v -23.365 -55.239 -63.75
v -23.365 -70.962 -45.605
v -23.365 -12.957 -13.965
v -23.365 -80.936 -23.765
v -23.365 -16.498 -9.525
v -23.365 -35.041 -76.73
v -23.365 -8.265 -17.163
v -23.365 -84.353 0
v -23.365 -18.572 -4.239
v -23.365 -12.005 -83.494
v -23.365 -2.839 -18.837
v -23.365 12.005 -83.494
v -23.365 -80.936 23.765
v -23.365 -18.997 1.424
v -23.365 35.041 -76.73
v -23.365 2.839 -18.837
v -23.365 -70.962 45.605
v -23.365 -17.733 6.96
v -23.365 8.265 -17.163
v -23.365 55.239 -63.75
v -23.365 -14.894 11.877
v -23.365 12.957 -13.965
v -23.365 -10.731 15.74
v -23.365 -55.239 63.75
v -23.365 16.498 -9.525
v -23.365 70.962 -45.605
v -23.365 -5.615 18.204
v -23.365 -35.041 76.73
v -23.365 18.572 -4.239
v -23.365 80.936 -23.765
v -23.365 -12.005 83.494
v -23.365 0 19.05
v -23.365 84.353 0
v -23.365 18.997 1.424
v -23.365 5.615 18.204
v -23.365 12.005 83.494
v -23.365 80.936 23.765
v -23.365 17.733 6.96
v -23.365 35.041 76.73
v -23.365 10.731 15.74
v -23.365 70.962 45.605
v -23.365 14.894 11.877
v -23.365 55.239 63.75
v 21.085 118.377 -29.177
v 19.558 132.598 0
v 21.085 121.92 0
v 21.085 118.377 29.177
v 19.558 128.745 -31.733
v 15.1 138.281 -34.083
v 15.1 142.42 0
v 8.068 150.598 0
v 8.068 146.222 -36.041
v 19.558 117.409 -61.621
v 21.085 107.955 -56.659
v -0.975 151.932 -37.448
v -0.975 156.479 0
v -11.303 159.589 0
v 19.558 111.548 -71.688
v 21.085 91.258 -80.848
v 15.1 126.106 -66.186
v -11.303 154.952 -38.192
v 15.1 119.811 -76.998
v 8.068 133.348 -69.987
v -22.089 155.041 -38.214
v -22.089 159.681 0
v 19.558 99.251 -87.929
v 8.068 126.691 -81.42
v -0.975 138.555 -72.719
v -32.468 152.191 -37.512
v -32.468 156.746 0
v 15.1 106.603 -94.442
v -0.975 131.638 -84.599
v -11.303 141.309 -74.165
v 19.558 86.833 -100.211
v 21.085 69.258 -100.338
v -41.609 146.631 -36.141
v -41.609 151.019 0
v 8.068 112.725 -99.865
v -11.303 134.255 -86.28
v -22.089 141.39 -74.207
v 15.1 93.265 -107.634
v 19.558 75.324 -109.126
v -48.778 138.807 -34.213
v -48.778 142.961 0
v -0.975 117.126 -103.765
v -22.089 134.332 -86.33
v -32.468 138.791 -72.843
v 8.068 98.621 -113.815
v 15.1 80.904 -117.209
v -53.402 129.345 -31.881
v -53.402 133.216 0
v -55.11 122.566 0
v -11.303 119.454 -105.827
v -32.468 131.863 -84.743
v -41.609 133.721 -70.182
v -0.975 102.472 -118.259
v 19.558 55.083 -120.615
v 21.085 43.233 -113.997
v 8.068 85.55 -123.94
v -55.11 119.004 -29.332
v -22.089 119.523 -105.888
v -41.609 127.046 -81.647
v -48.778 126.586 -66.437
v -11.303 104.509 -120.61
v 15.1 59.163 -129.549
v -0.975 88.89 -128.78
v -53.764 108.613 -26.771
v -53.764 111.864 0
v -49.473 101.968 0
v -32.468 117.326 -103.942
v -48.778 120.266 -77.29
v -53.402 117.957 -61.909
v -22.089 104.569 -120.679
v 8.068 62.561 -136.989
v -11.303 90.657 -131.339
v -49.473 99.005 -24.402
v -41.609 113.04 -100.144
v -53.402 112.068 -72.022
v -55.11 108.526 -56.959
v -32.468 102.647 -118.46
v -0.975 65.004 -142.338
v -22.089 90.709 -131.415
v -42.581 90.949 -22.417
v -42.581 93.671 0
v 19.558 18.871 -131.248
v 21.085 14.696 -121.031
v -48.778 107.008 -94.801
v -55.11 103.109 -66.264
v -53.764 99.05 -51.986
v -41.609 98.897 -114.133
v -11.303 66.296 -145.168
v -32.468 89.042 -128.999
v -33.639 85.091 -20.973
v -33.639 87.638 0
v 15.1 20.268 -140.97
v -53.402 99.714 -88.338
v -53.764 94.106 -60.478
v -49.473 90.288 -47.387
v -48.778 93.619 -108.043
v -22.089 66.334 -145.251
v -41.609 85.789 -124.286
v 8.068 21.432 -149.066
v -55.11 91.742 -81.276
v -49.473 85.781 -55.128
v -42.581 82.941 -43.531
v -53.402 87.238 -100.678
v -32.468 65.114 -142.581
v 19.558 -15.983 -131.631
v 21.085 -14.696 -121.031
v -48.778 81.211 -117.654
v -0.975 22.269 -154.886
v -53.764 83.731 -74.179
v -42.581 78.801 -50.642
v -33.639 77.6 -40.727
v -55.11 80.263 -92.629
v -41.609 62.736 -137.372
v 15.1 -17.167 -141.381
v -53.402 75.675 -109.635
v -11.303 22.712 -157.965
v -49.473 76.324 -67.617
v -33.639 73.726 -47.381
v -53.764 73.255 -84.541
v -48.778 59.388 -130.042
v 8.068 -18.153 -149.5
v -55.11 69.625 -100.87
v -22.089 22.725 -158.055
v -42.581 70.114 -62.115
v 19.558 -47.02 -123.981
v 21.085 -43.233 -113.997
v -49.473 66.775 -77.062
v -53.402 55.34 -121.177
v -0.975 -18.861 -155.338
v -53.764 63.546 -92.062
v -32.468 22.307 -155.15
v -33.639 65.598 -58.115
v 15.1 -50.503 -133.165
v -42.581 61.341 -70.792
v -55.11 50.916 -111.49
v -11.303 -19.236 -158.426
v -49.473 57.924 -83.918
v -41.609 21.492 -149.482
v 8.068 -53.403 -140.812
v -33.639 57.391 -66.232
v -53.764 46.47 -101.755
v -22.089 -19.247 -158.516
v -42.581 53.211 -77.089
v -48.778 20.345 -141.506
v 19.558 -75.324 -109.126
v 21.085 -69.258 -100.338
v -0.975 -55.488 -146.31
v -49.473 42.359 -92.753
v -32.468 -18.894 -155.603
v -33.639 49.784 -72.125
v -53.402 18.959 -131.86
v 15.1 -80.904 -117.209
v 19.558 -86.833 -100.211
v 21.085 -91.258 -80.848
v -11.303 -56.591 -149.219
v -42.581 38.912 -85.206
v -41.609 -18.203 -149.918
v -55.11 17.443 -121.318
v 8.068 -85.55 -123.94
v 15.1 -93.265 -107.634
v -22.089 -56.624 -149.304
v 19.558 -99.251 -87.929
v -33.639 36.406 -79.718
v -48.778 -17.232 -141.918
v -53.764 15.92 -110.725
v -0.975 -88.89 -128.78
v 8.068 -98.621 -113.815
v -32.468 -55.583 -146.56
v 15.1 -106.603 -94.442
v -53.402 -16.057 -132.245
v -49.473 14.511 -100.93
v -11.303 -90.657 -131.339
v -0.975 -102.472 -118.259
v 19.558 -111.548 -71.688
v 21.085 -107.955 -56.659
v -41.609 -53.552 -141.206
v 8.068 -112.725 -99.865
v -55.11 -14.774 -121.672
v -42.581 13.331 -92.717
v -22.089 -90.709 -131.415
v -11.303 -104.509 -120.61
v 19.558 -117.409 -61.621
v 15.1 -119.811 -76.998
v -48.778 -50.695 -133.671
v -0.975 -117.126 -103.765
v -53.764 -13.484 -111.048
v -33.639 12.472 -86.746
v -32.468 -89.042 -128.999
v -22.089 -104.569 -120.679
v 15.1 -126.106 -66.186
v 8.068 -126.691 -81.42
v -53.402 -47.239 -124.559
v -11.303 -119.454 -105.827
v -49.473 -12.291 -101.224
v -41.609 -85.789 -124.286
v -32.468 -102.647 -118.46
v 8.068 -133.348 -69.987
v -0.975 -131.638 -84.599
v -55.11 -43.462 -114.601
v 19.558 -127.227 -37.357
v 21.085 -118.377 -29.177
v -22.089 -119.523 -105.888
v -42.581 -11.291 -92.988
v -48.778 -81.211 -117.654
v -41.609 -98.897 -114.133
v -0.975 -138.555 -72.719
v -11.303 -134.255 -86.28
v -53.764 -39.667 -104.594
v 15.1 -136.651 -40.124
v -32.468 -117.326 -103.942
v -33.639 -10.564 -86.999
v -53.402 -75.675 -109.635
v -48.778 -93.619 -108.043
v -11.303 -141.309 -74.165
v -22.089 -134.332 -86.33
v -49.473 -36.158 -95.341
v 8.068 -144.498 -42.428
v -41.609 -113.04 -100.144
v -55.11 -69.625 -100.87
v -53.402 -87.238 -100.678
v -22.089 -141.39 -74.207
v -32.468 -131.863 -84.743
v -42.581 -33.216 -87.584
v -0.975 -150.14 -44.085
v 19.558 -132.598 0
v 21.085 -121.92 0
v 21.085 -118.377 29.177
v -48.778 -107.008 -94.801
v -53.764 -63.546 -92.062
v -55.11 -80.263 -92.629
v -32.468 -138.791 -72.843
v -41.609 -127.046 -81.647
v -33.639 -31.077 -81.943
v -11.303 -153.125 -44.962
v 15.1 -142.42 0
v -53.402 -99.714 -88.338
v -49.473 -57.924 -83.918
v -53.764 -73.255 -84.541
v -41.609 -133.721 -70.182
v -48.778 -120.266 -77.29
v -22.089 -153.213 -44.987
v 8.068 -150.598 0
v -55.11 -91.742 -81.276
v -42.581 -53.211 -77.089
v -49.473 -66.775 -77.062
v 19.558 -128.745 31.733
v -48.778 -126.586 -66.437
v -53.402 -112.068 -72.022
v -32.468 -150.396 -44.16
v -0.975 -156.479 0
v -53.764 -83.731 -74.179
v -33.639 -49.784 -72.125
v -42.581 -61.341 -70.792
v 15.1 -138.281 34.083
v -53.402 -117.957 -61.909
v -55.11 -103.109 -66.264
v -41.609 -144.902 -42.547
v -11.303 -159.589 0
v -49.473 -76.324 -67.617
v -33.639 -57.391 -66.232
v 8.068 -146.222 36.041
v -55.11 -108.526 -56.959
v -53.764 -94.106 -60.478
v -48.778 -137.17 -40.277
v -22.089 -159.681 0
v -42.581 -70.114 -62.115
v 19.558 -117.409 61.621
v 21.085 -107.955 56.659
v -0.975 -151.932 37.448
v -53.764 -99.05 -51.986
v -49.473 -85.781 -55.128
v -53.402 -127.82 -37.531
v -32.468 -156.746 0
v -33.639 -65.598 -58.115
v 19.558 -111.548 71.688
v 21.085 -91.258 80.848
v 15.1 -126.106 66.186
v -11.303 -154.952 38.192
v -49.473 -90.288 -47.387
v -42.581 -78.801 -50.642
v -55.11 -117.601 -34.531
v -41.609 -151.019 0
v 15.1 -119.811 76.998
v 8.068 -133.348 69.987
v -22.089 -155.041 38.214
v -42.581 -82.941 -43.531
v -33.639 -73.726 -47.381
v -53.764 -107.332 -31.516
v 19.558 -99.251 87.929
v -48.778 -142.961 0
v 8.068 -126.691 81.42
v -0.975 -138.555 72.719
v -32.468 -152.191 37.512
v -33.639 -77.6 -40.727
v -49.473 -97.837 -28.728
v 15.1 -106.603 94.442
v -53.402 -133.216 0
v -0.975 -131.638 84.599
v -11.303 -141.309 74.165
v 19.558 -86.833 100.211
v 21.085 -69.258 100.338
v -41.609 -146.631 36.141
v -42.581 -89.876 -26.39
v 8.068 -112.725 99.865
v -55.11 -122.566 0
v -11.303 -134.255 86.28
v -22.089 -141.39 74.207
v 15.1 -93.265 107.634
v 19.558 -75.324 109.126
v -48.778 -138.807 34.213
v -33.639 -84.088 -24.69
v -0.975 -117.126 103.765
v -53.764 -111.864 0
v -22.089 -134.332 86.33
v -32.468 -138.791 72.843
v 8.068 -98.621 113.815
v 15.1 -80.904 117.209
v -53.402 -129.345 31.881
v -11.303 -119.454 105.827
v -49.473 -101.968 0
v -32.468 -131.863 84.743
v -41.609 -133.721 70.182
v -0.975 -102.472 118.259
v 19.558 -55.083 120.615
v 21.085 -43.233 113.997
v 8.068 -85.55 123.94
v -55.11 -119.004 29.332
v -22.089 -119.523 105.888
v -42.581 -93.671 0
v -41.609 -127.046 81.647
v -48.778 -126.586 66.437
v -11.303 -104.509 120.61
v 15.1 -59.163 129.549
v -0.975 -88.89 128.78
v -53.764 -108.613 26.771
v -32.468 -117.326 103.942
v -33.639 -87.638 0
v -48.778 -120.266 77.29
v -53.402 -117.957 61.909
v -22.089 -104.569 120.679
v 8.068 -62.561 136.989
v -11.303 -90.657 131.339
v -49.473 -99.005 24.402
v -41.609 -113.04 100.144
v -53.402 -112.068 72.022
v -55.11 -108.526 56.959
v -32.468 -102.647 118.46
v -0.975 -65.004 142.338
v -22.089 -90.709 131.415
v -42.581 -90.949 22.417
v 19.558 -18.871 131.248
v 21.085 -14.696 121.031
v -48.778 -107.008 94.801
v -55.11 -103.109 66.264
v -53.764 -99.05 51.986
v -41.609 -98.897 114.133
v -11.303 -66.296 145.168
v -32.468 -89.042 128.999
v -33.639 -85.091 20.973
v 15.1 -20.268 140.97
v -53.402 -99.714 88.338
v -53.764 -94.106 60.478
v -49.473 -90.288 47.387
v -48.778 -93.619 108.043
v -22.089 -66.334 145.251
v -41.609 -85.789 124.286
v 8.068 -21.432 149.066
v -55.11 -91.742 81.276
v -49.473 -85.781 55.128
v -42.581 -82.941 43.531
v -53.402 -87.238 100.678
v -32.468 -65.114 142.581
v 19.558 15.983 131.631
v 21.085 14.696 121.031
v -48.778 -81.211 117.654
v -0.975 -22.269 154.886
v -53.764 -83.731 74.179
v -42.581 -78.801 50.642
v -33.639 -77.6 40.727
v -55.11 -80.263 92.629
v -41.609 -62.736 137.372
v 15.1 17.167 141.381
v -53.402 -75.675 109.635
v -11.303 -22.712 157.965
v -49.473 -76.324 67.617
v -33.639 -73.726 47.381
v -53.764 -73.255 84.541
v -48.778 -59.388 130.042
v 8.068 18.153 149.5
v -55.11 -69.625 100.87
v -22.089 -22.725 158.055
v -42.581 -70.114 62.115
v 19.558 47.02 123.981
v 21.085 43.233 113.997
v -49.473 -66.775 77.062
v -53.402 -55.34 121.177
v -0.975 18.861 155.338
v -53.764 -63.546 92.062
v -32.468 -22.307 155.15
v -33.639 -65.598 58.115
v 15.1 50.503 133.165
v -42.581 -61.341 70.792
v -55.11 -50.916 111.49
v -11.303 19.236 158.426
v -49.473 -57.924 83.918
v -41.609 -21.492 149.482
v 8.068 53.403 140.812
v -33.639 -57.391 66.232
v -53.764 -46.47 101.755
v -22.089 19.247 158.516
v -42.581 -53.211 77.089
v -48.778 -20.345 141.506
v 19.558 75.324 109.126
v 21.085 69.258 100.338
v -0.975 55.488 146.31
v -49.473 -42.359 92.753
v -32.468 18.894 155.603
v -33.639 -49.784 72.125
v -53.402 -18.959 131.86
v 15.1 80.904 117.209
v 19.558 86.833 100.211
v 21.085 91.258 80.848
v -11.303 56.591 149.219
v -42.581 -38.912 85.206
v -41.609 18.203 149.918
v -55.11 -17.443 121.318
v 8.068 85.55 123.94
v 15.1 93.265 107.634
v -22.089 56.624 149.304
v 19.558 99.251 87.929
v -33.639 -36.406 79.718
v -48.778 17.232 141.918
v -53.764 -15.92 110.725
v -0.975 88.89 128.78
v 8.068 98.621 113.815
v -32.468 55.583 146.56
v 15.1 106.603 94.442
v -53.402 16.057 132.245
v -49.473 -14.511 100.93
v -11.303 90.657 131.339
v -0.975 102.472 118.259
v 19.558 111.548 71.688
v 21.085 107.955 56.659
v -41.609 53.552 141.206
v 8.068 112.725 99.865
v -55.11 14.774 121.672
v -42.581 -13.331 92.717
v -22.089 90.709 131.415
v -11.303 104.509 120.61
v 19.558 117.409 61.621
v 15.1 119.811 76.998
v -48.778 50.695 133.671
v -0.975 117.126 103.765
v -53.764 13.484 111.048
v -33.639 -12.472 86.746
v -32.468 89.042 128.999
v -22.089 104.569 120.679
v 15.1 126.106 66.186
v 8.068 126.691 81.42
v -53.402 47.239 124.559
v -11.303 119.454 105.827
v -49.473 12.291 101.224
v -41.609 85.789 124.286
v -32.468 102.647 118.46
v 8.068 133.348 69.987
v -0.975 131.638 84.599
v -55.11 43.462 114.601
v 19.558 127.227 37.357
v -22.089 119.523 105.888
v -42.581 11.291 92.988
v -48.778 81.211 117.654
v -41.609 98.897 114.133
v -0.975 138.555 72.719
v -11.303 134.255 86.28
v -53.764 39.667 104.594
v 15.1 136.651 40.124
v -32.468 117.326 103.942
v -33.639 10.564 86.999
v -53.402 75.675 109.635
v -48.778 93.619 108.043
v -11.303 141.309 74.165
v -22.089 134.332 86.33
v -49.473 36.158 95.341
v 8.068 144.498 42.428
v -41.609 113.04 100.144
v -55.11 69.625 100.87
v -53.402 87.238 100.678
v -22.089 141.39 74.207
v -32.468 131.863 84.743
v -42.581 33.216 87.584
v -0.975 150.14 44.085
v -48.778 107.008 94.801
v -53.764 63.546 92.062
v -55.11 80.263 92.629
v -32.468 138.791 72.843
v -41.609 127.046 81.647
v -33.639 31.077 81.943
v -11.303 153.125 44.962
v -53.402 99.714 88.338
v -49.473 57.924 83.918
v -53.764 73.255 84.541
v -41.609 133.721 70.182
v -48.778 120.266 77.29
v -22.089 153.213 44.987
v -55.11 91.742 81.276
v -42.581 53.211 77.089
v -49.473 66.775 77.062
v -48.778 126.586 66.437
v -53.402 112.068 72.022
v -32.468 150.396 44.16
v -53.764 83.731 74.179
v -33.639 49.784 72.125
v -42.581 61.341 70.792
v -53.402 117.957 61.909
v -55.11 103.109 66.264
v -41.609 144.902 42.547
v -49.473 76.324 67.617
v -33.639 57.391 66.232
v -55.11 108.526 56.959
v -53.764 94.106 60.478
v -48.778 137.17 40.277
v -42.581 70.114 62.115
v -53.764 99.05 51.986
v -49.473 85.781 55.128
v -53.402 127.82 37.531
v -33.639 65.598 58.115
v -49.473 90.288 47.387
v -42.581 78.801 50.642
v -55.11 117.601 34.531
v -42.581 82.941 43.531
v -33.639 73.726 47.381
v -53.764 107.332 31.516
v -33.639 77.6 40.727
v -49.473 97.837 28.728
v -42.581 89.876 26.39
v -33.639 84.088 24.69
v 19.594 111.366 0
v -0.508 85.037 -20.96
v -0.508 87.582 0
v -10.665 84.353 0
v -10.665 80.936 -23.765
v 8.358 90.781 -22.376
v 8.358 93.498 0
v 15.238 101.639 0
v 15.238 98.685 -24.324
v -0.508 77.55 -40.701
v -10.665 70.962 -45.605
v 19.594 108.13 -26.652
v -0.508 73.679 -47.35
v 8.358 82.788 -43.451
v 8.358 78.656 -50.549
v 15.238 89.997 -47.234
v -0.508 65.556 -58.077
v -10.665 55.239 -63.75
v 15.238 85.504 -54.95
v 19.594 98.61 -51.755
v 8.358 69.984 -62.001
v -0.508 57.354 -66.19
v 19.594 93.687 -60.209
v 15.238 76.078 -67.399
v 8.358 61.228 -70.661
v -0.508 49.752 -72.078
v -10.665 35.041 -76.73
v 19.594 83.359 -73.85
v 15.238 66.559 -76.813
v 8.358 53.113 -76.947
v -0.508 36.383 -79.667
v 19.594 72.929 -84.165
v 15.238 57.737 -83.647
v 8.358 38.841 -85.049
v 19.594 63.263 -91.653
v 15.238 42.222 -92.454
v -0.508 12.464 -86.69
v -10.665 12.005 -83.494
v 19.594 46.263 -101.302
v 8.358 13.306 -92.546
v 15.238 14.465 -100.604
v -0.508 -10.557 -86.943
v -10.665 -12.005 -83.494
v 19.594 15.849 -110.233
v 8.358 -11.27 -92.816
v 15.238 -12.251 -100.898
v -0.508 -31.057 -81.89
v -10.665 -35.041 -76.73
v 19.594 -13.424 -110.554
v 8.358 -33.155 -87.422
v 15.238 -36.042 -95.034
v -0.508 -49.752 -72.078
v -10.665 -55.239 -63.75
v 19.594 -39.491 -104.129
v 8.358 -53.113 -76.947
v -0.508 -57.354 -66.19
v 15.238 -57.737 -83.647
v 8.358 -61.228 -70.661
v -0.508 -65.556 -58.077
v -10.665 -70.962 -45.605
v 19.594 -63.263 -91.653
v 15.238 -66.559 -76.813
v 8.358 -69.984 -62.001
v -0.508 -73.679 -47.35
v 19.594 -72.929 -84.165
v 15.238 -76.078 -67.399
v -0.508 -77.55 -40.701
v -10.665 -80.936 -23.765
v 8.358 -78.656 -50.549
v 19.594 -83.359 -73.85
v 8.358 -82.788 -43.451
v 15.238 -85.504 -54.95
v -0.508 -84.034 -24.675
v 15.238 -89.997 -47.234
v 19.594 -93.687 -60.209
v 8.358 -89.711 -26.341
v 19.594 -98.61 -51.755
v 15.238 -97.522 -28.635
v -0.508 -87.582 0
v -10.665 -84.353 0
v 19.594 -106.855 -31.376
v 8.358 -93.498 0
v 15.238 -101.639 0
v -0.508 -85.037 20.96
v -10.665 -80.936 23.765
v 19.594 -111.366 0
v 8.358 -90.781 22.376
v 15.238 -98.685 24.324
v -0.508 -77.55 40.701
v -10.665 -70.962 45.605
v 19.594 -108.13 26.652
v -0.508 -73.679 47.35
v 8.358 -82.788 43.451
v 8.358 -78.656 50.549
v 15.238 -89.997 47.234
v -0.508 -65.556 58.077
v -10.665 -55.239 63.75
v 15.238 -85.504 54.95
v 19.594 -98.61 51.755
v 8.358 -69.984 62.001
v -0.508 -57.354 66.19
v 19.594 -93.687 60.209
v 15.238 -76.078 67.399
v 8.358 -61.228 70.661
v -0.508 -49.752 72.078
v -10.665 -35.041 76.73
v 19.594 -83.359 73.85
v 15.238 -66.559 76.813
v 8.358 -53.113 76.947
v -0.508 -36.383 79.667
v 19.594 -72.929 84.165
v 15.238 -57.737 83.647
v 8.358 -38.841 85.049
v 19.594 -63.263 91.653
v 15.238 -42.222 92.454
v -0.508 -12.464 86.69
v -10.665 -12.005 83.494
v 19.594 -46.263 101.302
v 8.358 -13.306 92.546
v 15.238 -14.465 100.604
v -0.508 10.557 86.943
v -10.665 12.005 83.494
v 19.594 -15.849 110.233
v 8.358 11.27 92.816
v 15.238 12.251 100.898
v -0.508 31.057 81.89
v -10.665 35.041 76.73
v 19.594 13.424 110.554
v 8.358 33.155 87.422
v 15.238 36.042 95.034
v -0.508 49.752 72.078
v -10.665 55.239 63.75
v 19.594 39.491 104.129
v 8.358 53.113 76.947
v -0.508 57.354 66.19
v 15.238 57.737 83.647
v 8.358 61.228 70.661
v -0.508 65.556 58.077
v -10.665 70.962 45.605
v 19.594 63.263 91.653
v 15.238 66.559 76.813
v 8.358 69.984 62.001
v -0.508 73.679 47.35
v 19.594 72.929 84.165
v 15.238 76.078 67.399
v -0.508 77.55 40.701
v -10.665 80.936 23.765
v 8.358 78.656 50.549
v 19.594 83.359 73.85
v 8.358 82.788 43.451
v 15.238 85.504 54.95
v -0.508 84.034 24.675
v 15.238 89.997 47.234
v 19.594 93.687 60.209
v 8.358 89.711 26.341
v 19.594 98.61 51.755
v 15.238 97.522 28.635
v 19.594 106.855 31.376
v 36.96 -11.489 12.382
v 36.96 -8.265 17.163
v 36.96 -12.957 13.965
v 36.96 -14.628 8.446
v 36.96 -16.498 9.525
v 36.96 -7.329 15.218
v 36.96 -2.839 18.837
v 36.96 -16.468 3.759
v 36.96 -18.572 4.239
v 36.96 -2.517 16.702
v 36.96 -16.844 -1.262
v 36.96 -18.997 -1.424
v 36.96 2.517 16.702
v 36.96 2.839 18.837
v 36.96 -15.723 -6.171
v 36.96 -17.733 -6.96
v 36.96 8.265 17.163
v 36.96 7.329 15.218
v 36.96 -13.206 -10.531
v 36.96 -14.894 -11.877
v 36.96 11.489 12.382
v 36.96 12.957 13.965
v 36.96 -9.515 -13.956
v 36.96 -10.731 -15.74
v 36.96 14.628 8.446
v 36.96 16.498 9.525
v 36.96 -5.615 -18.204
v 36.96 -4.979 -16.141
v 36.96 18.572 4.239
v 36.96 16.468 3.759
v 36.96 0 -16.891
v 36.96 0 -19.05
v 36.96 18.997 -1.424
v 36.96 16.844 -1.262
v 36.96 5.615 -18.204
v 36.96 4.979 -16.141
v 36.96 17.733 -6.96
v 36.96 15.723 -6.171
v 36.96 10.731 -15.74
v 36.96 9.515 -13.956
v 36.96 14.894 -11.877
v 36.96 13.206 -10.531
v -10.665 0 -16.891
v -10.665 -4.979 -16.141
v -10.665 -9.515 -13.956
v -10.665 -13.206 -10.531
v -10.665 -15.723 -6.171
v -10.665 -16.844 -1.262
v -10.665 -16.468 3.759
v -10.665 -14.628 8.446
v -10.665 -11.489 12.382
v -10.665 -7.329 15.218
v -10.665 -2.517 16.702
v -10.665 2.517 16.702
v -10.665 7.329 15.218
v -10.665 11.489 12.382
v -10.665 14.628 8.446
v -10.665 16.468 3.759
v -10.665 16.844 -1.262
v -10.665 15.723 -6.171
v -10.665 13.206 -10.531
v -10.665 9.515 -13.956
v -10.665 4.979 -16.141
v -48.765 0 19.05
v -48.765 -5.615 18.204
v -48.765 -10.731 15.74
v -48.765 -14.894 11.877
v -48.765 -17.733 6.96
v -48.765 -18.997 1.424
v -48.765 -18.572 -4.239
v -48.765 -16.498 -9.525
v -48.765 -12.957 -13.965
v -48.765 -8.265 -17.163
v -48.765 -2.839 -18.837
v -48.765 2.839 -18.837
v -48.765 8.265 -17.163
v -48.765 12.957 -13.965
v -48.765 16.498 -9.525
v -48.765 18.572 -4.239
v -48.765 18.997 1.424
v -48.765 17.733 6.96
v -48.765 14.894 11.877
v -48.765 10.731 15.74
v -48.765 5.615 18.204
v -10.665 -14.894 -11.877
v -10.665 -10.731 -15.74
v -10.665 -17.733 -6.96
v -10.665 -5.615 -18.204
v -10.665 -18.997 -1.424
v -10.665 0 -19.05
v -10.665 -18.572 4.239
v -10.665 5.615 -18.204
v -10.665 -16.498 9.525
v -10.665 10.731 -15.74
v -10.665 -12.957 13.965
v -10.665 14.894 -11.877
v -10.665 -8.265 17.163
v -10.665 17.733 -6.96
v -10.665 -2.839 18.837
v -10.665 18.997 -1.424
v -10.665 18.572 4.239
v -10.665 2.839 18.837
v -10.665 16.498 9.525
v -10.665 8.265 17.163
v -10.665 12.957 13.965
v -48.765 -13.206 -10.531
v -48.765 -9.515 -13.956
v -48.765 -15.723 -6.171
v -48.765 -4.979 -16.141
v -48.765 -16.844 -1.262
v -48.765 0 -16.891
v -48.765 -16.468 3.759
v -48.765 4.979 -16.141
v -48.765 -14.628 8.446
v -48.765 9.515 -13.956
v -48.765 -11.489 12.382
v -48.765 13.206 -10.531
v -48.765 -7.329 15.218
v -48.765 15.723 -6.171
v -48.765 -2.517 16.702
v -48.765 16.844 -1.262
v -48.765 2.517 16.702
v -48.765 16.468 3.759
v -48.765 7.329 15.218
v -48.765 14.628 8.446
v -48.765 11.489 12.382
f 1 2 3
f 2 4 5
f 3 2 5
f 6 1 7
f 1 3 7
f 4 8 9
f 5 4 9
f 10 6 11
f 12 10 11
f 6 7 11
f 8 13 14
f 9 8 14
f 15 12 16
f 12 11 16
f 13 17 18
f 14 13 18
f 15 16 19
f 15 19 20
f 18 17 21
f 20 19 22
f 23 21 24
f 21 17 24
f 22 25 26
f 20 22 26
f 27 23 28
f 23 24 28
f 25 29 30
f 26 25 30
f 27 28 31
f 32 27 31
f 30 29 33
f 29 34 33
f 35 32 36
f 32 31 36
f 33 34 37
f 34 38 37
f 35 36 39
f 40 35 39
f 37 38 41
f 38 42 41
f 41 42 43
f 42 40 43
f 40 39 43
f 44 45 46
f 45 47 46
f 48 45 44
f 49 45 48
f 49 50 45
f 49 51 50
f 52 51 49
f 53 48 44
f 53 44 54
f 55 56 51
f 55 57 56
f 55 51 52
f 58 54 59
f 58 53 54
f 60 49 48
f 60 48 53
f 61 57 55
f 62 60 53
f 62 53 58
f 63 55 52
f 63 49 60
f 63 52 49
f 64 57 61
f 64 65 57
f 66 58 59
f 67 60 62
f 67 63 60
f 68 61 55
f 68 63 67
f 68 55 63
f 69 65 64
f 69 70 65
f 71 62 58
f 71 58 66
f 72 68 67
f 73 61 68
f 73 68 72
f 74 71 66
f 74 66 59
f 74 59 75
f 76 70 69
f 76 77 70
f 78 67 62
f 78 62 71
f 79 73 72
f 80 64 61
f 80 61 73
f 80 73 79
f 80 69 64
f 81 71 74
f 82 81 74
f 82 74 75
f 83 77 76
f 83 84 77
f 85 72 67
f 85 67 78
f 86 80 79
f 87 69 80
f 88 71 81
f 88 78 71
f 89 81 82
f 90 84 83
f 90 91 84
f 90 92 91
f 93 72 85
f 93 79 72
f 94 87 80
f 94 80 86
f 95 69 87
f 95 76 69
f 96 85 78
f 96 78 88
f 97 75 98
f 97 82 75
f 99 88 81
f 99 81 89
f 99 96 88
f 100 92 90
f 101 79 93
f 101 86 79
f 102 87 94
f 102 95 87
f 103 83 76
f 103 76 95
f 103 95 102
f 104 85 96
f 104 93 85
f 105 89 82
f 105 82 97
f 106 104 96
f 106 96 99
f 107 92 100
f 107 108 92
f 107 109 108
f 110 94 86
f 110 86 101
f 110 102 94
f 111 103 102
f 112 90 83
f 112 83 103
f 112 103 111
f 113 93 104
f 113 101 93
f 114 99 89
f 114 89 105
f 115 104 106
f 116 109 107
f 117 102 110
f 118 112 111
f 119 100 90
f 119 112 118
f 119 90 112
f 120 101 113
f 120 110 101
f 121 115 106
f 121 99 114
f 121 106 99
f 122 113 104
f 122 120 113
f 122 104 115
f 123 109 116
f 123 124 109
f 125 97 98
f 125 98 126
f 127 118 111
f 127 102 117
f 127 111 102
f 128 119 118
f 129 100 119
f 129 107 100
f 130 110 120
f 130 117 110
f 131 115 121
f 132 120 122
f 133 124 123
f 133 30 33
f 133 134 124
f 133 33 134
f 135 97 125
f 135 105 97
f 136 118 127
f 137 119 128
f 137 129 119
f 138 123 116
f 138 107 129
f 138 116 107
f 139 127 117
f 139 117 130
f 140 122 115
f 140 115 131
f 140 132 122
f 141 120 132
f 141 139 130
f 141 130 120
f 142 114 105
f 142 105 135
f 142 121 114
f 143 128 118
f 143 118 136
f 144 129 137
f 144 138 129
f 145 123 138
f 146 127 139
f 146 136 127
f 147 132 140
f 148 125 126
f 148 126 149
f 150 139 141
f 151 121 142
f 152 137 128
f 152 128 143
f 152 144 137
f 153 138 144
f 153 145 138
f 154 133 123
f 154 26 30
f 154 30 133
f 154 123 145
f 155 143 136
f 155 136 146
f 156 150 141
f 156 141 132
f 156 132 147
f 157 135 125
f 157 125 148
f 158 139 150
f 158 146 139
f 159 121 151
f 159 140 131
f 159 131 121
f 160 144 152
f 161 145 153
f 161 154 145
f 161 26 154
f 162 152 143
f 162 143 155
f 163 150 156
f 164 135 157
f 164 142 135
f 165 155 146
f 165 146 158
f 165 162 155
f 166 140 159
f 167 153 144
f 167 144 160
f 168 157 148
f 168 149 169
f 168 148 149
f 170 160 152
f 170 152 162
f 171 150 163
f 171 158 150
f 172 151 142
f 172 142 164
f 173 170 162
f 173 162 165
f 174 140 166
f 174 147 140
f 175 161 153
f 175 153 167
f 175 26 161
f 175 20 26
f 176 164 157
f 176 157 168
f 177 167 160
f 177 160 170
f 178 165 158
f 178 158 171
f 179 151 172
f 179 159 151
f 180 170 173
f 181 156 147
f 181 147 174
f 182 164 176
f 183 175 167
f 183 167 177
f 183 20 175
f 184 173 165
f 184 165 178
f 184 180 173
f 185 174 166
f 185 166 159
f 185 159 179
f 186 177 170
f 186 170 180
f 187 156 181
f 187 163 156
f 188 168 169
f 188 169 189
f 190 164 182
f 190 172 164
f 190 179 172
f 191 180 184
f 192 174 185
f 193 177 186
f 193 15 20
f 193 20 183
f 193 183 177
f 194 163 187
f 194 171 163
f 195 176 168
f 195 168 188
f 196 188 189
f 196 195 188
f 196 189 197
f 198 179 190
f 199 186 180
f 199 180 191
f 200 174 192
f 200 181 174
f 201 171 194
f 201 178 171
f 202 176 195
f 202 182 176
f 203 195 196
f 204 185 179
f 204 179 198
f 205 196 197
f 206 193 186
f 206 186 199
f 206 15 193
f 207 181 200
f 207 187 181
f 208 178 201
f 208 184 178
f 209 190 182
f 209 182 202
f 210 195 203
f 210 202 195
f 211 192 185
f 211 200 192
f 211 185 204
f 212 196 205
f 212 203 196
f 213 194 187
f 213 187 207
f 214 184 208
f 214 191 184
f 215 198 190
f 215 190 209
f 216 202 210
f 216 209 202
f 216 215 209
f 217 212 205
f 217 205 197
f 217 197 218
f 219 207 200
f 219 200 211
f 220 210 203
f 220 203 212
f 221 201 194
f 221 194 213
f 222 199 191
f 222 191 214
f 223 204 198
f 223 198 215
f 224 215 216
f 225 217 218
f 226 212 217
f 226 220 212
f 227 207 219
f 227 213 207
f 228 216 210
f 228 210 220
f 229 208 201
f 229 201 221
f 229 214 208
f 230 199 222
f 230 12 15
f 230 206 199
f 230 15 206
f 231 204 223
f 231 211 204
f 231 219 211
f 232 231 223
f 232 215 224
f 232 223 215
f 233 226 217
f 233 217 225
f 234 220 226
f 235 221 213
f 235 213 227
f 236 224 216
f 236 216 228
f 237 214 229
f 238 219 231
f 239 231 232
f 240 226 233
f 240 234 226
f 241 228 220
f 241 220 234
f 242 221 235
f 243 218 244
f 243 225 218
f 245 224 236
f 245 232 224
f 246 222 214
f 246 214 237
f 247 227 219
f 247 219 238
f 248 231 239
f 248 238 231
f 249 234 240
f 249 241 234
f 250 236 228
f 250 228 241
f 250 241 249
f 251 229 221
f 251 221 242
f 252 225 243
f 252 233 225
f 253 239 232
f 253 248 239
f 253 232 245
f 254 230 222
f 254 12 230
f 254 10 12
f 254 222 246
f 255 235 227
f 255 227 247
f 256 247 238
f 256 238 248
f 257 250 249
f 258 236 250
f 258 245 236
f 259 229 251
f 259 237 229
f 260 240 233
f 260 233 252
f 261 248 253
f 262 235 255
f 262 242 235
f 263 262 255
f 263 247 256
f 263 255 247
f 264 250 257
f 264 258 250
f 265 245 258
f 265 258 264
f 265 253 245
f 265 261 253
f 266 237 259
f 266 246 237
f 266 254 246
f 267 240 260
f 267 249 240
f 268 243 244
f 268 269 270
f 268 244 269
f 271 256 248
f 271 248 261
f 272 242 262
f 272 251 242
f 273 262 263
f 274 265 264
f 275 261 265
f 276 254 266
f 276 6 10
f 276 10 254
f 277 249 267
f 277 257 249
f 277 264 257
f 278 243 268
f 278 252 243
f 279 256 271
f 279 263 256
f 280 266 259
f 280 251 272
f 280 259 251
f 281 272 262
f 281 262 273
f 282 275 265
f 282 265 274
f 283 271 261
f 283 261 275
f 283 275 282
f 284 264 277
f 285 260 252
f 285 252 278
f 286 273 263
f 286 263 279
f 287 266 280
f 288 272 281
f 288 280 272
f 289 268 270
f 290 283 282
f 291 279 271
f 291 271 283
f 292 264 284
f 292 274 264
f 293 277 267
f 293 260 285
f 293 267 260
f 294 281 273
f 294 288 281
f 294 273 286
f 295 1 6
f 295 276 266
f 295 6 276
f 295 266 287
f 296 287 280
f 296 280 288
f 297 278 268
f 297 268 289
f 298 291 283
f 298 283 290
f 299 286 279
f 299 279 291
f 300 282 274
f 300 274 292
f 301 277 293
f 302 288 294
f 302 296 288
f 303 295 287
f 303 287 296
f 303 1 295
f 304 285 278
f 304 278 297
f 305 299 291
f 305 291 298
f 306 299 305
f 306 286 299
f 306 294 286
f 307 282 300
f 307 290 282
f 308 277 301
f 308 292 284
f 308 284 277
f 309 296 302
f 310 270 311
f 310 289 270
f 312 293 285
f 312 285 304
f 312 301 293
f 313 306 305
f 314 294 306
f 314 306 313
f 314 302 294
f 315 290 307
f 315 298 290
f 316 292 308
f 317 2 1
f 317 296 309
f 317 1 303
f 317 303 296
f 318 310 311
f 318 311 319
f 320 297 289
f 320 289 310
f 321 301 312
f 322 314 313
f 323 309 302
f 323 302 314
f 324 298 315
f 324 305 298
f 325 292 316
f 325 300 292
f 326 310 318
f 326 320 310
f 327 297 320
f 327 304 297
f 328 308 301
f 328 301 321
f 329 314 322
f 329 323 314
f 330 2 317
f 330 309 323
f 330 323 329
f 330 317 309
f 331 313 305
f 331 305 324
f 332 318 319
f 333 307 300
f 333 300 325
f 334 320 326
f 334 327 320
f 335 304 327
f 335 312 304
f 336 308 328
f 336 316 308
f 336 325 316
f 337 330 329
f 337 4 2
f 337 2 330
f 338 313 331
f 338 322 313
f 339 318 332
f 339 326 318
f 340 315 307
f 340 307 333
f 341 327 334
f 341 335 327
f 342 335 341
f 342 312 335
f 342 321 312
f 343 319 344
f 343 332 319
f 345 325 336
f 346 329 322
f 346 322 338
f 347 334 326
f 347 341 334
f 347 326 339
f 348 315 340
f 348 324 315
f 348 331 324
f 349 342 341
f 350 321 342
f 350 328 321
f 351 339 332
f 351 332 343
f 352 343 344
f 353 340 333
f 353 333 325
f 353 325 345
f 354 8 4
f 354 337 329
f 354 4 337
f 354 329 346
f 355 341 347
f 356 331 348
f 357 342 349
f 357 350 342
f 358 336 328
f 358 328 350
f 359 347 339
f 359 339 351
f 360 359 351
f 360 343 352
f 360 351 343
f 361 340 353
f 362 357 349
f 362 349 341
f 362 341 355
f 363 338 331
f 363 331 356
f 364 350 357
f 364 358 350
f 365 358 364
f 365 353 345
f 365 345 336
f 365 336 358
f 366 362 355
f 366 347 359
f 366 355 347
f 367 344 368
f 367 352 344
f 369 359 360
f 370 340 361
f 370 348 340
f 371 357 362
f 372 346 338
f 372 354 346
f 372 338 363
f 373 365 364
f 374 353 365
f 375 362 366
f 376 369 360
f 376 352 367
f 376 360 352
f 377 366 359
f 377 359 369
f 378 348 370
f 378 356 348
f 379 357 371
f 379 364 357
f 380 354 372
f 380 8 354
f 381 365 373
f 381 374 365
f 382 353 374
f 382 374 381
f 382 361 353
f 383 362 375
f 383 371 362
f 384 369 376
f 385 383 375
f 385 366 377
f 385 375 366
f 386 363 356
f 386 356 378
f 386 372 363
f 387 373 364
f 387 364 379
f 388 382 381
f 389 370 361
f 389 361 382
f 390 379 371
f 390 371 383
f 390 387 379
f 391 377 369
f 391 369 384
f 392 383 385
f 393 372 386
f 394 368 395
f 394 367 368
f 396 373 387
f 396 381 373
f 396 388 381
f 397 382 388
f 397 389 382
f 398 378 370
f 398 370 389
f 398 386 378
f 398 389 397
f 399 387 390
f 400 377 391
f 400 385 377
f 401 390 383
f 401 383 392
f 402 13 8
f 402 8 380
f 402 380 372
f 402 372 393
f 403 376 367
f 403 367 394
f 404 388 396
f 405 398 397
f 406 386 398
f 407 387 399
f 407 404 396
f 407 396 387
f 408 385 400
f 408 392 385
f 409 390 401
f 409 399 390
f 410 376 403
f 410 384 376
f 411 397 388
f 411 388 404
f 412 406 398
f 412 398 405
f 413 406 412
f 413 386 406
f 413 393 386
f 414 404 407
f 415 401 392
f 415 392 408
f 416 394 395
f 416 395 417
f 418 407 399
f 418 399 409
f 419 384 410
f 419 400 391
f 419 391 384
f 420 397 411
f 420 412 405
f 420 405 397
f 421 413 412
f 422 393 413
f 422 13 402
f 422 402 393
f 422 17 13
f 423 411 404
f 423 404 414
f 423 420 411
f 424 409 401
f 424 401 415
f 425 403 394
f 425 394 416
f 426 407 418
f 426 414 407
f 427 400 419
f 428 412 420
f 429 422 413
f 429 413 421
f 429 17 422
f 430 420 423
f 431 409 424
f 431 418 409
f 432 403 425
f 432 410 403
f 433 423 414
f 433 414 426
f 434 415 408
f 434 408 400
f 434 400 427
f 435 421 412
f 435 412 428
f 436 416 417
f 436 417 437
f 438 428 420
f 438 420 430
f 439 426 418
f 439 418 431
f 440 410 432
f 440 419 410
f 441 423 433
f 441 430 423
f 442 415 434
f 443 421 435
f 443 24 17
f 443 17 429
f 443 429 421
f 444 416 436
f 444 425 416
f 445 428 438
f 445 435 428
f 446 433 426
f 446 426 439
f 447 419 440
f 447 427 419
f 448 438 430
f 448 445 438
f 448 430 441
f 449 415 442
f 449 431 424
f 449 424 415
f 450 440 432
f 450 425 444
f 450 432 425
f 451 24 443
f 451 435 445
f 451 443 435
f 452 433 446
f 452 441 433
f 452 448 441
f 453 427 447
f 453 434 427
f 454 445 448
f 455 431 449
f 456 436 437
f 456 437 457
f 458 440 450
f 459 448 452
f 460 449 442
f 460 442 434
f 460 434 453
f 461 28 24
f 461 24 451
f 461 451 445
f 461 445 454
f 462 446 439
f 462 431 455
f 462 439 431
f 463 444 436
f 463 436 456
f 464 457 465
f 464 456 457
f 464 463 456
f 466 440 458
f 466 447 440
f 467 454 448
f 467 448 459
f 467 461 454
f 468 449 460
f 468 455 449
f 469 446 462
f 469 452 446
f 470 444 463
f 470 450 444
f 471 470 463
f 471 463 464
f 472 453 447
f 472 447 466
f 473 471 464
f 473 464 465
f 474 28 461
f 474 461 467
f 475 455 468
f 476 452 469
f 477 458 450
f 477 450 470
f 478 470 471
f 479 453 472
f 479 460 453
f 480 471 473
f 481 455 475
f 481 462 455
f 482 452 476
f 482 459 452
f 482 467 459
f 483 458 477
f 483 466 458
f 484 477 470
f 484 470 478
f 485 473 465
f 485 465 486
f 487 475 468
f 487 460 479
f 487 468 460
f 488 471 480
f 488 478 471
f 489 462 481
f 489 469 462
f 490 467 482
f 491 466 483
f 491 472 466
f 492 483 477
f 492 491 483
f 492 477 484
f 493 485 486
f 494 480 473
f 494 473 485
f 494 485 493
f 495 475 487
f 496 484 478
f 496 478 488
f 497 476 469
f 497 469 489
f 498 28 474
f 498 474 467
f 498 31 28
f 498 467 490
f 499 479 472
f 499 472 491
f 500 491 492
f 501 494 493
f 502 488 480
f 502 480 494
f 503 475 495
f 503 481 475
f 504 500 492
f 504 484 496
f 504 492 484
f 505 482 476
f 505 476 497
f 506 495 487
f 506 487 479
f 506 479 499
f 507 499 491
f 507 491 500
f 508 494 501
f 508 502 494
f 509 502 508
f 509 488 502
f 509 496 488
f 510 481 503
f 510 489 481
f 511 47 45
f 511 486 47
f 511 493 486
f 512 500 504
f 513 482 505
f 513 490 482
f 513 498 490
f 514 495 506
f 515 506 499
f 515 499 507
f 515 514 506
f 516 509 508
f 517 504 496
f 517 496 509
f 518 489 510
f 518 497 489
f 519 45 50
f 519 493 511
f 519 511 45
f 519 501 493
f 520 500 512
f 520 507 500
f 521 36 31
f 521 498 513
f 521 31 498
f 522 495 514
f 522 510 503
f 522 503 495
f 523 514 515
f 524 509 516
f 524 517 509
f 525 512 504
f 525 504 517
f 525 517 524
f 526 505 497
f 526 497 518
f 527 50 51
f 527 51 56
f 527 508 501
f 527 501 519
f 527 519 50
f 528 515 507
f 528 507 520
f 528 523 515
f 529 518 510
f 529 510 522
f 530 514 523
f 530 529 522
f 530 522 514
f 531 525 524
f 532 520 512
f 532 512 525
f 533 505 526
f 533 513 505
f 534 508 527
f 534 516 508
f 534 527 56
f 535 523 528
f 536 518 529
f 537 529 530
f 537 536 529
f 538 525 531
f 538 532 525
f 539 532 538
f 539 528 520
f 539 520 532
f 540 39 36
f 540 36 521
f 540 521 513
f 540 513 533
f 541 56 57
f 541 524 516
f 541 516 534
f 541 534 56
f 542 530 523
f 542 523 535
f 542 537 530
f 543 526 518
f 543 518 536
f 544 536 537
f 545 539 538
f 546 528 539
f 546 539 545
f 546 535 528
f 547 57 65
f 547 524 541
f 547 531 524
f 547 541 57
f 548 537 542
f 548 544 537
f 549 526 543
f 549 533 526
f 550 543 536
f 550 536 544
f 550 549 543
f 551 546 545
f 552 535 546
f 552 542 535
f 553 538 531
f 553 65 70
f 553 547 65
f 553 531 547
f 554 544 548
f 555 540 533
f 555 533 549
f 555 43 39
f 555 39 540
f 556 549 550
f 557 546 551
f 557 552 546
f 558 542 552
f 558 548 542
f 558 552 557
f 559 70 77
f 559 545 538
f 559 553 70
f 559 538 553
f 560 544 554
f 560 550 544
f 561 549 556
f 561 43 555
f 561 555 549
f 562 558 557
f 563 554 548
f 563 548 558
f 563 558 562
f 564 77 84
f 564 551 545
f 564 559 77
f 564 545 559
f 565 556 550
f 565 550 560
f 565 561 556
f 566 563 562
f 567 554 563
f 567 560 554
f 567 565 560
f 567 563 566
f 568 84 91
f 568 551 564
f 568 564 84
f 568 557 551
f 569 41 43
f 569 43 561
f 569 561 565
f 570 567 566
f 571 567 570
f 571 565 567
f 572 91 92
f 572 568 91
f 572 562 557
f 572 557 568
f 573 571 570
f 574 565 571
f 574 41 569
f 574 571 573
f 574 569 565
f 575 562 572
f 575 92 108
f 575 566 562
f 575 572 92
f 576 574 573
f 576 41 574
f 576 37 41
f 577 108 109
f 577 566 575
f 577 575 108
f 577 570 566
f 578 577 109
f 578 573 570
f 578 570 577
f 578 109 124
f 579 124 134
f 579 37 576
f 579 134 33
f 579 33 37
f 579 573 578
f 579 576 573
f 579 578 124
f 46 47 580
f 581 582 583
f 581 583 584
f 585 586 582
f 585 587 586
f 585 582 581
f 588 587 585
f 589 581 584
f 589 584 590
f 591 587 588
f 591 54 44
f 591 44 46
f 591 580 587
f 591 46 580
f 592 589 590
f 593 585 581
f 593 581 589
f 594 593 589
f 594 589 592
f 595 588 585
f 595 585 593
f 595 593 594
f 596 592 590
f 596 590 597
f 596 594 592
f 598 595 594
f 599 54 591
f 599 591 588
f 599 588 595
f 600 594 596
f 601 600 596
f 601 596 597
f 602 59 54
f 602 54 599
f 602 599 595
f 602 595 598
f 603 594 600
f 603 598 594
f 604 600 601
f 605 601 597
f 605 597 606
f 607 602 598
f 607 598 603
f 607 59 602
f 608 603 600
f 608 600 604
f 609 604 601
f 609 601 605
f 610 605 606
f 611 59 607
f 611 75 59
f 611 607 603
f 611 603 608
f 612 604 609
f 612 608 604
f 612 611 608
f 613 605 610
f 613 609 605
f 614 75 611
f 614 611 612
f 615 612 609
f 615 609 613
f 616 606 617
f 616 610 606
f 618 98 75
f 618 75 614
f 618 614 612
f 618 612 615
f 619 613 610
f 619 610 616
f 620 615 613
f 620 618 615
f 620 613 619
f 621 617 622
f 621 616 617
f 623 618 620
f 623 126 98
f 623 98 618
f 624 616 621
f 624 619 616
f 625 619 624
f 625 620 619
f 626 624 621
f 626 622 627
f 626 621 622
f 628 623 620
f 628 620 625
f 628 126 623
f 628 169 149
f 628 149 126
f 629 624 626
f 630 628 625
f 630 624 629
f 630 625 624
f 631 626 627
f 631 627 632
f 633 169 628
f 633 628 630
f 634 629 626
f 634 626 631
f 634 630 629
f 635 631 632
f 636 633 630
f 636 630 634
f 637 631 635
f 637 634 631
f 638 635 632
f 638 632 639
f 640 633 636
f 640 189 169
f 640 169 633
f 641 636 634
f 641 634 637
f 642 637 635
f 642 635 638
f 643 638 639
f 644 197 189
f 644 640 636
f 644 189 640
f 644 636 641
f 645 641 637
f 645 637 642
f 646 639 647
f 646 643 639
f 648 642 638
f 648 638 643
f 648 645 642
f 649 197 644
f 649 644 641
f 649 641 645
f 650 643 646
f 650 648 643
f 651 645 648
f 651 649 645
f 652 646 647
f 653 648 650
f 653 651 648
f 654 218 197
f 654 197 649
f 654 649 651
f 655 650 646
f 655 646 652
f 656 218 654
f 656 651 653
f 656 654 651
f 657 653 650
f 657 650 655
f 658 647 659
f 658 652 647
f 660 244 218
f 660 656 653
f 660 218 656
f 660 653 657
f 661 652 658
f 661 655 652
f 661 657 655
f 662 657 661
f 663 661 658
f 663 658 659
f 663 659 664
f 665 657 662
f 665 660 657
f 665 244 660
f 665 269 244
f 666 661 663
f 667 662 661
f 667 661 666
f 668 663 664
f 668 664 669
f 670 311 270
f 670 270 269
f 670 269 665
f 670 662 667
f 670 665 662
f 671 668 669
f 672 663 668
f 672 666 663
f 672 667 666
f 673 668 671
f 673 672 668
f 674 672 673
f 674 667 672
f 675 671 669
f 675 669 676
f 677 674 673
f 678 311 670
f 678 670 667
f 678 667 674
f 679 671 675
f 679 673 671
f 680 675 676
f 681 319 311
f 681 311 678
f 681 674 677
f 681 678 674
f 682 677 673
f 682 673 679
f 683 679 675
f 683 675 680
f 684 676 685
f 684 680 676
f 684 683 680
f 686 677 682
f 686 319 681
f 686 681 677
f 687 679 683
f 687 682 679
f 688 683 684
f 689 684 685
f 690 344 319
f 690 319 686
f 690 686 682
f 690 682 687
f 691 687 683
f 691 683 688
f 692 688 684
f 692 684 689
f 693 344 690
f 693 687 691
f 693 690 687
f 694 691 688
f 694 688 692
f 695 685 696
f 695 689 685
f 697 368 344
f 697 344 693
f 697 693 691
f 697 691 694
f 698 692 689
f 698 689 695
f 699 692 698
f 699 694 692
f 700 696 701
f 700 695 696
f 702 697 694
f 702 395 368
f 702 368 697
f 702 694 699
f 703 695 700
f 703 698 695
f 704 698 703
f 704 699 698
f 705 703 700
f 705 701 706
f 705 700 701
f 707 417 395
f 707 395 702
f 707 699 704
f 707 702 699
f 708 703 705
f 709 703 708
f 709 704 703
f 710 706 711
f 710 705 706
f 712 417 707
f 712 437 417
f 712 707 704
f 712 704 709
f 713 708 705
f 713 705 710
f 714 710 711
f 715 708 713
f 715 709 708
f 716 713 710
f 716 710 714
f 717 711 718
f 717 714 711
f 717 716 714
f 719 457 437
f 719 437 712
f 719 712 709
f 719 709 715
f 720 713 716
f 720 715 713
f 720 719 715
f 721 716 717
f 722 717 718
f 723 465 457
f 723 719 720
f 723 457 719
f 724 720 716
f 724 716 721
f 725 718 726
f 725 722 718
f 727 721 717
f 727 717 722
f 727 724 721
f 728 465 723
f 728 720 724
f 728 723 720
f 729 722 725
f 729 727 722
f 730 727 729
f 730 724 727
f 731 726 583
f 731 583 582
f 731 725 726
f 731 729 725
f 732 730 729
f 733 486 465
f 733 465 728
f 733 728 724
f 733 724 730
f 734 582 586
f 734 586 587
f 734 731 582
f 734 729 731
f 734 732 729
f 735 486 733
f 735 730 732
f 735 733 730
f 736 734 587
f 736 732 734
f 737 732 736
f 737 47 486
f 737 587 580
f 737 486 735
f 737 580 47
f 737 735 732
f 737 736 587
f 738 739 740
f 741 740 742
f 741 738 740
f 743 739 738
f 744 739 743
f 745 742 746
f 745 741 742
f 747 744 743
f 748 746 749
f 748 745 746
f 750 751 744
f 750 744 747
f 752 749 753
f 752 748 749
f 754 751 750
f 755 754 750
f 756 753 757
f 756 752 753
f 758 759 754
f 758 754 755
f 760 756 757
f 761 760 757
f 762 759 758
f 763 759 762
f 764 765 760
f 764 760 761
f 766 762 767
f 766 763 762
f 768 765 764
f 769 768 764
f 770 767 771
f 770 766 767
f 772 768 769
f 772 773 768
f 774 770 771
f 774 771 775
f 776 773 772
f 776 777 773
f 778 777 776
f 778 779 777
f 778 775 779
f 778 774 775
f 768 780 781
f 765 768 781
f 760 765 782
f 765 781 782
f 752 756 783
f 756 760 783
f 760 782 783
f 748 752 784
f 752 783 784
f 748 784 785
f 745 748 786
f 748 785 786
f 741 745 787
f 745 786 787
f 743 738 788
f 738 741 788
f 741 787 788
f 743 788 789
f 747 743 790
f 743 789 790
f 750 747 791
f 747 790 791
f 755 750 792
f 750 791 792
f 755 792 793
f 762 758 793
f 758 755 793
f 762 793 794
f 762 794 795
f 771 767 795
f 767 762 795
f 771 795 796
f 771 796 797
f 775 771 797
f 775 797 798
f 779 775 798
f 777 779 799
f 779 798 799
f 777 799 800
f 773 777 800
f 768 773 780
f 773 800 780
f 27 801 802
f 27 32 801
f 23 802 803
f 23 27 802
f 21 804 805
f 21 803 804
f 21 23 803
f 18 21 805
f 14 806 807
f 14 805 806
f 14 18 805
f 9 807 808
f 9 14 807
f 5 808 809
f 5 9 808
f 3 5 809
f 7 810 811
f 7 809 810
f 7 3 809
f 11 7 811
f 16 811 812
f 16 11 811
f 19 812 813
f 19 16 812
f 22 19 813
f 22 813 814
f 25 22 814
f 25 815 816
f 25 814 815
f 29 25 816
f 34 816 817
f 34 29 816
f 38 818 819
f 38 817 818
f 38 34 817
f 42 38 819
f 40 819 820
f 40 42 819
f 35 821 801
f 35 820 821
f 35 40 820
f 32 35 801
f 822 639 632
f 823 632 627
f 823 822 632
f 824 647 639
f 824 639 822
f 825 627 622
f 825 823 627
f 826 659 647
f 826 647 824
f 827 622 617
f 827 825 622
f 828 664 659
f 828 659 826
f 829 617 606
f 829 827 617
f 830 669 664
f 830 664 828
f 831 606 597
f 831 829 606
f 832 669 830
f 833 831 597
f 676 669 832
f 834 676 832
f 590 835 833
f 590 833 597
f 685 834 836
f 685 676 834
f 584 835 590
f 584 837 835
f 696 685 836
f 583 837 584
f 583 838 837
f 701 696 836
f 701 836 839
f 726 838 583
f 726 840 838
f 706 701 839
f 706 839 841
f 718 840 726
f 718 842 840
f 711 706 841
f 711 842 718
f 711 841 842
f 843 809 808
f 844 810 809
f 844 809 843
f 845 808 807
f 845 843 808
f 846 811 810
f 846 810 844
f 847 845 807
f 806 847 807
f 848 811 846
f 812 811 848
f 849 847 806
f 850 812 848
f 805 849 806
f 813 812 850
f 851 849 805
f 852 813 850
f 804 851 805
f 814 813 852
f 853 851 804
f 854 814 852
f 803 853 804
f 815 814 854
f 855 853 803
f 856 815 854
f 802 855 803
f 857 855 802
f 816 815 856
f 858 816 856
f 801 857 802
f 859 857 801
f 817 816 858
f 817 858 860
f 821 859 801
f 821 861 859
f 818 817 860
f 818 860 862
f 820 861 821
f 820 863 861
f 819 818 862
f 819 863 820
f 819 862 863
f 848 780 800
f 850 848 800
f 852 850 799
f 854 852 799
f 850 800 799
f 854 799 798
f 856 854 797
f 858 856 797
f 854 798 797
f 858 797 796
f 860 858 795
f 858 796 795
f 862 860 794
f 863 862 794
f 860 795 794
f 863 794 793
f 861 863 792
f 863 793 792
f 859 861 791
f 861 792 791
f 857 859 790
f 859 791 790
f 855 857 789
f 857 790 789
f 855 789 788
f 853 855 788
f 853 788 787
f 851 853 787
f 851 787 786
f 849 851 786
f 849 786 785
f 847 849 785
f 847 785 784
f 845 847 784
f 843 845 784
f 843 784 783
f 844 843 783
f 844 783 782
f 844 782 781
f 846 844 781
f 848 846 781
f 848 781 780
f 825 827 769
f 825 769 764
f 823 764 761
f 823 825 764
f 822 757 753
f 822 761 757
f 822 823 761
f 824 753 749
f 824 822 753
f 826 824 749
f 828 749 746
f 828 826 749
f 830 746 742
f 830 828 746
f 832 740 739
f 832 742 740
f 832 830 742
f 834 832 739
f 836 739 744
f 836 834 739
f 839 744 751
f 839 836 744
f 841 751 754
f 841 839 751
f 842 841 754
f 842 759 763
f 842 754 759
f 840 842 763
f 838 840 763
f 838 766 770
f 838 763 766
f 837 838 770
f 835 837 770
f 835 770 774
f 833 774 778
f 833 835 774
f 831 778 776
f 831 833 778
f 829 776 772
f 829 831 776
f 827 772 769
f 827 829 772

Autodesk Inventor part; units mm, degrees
ref_plane "YZ Plane" through (0, 0, 0) normal (1, 0, 0) x (0, 1, 0)
ref_plane "XZ Plane" through (0, 0, 0) normal (0, 1, 0) x (-1, 0, 0)
ref_plane "XY Plane" through (0, 0, 0) normal (0, 0, 1) x (1, 0, 0)
sketch "Sketch1" plane through (0, 0, 0) normal (0, 0, 1) x (1, 0, 0)
  line L0 (-23.3654, 0) -> (-10.6654, 0)
  line L1 (-10.6654, 0) -> (-10.6654, 121.92)
  line L2 (-10.6654, 121.92) -> (-23.3654, 121.92)
  line L3 (-23.3654, 121.92) -> (-23.3654, 0)
  circle A0 centre (-17.0154, 121.92) radius 38.1
  point P0 (0, 0)
  point P1 (-10.6654, 84.3529)
  point P2 (-23.3654, 84.3529)
  point P3 (-17.0154, 88.9)
  point P4 (-17.0154, 88.9)
  dimension "d1" = 76.2
  dimension "d2" = 121.92
  dimension "d4" = 12.7
  dimension "d5" = 6.35
revolve "Revolution5" add sketch "Sketch1" angle 360 about axis through (-23.3654, 0, 0) along (1, 0, 0)
sketch "Sketch3" plane through (-23.3654, 0, 0) normal (-1, 0, 0) x (0, 0, 1)
  circle A0 centre (0, 0) radius 19.05
  dimension "d10" = 38.1
extrude "Extrusion1" add sketch "Sketch3" along normal blind 25.4
sketch "Sketch4" plane through (-48.7654, 0, 0) normal (-1, 0, 0) x (0, 0, 1)
  circle A0 centre (0, 0) radius 11.1125
  dimension "d13" = 22.225
extrude "Extrusion2" cut sketch "Sketch4" against normal blind 25.4
sketch "Sketch5" plane through (-10.6654, 0, 0) normal (1, 0, 0) x (0, 0, -1)
  circle A0 centre (0, 0) radius 19.05
  circle A1 centre (0, 0) radius 16.891
  dimension "d16" = 38.1
  dimension "d17" = 33.782
extrude "Extrusion3" add sketch "Sketch5" along normal blind 47.625
sketch "Sketch6" plane through (-10.6654, 0, 0) normal (1, 0, 0) x (0, 0, -1)
  circle A0 centre (0, 0) radius 11.1125 projected
  circle A1 centre (0, 0) radius 16.891
  point P0 (0, 0)
extrude "Extrusion4" cut sketch "Sketch6" against normal blind 76.2 contours A0 | A1
properties part number "Savior Wheel"
